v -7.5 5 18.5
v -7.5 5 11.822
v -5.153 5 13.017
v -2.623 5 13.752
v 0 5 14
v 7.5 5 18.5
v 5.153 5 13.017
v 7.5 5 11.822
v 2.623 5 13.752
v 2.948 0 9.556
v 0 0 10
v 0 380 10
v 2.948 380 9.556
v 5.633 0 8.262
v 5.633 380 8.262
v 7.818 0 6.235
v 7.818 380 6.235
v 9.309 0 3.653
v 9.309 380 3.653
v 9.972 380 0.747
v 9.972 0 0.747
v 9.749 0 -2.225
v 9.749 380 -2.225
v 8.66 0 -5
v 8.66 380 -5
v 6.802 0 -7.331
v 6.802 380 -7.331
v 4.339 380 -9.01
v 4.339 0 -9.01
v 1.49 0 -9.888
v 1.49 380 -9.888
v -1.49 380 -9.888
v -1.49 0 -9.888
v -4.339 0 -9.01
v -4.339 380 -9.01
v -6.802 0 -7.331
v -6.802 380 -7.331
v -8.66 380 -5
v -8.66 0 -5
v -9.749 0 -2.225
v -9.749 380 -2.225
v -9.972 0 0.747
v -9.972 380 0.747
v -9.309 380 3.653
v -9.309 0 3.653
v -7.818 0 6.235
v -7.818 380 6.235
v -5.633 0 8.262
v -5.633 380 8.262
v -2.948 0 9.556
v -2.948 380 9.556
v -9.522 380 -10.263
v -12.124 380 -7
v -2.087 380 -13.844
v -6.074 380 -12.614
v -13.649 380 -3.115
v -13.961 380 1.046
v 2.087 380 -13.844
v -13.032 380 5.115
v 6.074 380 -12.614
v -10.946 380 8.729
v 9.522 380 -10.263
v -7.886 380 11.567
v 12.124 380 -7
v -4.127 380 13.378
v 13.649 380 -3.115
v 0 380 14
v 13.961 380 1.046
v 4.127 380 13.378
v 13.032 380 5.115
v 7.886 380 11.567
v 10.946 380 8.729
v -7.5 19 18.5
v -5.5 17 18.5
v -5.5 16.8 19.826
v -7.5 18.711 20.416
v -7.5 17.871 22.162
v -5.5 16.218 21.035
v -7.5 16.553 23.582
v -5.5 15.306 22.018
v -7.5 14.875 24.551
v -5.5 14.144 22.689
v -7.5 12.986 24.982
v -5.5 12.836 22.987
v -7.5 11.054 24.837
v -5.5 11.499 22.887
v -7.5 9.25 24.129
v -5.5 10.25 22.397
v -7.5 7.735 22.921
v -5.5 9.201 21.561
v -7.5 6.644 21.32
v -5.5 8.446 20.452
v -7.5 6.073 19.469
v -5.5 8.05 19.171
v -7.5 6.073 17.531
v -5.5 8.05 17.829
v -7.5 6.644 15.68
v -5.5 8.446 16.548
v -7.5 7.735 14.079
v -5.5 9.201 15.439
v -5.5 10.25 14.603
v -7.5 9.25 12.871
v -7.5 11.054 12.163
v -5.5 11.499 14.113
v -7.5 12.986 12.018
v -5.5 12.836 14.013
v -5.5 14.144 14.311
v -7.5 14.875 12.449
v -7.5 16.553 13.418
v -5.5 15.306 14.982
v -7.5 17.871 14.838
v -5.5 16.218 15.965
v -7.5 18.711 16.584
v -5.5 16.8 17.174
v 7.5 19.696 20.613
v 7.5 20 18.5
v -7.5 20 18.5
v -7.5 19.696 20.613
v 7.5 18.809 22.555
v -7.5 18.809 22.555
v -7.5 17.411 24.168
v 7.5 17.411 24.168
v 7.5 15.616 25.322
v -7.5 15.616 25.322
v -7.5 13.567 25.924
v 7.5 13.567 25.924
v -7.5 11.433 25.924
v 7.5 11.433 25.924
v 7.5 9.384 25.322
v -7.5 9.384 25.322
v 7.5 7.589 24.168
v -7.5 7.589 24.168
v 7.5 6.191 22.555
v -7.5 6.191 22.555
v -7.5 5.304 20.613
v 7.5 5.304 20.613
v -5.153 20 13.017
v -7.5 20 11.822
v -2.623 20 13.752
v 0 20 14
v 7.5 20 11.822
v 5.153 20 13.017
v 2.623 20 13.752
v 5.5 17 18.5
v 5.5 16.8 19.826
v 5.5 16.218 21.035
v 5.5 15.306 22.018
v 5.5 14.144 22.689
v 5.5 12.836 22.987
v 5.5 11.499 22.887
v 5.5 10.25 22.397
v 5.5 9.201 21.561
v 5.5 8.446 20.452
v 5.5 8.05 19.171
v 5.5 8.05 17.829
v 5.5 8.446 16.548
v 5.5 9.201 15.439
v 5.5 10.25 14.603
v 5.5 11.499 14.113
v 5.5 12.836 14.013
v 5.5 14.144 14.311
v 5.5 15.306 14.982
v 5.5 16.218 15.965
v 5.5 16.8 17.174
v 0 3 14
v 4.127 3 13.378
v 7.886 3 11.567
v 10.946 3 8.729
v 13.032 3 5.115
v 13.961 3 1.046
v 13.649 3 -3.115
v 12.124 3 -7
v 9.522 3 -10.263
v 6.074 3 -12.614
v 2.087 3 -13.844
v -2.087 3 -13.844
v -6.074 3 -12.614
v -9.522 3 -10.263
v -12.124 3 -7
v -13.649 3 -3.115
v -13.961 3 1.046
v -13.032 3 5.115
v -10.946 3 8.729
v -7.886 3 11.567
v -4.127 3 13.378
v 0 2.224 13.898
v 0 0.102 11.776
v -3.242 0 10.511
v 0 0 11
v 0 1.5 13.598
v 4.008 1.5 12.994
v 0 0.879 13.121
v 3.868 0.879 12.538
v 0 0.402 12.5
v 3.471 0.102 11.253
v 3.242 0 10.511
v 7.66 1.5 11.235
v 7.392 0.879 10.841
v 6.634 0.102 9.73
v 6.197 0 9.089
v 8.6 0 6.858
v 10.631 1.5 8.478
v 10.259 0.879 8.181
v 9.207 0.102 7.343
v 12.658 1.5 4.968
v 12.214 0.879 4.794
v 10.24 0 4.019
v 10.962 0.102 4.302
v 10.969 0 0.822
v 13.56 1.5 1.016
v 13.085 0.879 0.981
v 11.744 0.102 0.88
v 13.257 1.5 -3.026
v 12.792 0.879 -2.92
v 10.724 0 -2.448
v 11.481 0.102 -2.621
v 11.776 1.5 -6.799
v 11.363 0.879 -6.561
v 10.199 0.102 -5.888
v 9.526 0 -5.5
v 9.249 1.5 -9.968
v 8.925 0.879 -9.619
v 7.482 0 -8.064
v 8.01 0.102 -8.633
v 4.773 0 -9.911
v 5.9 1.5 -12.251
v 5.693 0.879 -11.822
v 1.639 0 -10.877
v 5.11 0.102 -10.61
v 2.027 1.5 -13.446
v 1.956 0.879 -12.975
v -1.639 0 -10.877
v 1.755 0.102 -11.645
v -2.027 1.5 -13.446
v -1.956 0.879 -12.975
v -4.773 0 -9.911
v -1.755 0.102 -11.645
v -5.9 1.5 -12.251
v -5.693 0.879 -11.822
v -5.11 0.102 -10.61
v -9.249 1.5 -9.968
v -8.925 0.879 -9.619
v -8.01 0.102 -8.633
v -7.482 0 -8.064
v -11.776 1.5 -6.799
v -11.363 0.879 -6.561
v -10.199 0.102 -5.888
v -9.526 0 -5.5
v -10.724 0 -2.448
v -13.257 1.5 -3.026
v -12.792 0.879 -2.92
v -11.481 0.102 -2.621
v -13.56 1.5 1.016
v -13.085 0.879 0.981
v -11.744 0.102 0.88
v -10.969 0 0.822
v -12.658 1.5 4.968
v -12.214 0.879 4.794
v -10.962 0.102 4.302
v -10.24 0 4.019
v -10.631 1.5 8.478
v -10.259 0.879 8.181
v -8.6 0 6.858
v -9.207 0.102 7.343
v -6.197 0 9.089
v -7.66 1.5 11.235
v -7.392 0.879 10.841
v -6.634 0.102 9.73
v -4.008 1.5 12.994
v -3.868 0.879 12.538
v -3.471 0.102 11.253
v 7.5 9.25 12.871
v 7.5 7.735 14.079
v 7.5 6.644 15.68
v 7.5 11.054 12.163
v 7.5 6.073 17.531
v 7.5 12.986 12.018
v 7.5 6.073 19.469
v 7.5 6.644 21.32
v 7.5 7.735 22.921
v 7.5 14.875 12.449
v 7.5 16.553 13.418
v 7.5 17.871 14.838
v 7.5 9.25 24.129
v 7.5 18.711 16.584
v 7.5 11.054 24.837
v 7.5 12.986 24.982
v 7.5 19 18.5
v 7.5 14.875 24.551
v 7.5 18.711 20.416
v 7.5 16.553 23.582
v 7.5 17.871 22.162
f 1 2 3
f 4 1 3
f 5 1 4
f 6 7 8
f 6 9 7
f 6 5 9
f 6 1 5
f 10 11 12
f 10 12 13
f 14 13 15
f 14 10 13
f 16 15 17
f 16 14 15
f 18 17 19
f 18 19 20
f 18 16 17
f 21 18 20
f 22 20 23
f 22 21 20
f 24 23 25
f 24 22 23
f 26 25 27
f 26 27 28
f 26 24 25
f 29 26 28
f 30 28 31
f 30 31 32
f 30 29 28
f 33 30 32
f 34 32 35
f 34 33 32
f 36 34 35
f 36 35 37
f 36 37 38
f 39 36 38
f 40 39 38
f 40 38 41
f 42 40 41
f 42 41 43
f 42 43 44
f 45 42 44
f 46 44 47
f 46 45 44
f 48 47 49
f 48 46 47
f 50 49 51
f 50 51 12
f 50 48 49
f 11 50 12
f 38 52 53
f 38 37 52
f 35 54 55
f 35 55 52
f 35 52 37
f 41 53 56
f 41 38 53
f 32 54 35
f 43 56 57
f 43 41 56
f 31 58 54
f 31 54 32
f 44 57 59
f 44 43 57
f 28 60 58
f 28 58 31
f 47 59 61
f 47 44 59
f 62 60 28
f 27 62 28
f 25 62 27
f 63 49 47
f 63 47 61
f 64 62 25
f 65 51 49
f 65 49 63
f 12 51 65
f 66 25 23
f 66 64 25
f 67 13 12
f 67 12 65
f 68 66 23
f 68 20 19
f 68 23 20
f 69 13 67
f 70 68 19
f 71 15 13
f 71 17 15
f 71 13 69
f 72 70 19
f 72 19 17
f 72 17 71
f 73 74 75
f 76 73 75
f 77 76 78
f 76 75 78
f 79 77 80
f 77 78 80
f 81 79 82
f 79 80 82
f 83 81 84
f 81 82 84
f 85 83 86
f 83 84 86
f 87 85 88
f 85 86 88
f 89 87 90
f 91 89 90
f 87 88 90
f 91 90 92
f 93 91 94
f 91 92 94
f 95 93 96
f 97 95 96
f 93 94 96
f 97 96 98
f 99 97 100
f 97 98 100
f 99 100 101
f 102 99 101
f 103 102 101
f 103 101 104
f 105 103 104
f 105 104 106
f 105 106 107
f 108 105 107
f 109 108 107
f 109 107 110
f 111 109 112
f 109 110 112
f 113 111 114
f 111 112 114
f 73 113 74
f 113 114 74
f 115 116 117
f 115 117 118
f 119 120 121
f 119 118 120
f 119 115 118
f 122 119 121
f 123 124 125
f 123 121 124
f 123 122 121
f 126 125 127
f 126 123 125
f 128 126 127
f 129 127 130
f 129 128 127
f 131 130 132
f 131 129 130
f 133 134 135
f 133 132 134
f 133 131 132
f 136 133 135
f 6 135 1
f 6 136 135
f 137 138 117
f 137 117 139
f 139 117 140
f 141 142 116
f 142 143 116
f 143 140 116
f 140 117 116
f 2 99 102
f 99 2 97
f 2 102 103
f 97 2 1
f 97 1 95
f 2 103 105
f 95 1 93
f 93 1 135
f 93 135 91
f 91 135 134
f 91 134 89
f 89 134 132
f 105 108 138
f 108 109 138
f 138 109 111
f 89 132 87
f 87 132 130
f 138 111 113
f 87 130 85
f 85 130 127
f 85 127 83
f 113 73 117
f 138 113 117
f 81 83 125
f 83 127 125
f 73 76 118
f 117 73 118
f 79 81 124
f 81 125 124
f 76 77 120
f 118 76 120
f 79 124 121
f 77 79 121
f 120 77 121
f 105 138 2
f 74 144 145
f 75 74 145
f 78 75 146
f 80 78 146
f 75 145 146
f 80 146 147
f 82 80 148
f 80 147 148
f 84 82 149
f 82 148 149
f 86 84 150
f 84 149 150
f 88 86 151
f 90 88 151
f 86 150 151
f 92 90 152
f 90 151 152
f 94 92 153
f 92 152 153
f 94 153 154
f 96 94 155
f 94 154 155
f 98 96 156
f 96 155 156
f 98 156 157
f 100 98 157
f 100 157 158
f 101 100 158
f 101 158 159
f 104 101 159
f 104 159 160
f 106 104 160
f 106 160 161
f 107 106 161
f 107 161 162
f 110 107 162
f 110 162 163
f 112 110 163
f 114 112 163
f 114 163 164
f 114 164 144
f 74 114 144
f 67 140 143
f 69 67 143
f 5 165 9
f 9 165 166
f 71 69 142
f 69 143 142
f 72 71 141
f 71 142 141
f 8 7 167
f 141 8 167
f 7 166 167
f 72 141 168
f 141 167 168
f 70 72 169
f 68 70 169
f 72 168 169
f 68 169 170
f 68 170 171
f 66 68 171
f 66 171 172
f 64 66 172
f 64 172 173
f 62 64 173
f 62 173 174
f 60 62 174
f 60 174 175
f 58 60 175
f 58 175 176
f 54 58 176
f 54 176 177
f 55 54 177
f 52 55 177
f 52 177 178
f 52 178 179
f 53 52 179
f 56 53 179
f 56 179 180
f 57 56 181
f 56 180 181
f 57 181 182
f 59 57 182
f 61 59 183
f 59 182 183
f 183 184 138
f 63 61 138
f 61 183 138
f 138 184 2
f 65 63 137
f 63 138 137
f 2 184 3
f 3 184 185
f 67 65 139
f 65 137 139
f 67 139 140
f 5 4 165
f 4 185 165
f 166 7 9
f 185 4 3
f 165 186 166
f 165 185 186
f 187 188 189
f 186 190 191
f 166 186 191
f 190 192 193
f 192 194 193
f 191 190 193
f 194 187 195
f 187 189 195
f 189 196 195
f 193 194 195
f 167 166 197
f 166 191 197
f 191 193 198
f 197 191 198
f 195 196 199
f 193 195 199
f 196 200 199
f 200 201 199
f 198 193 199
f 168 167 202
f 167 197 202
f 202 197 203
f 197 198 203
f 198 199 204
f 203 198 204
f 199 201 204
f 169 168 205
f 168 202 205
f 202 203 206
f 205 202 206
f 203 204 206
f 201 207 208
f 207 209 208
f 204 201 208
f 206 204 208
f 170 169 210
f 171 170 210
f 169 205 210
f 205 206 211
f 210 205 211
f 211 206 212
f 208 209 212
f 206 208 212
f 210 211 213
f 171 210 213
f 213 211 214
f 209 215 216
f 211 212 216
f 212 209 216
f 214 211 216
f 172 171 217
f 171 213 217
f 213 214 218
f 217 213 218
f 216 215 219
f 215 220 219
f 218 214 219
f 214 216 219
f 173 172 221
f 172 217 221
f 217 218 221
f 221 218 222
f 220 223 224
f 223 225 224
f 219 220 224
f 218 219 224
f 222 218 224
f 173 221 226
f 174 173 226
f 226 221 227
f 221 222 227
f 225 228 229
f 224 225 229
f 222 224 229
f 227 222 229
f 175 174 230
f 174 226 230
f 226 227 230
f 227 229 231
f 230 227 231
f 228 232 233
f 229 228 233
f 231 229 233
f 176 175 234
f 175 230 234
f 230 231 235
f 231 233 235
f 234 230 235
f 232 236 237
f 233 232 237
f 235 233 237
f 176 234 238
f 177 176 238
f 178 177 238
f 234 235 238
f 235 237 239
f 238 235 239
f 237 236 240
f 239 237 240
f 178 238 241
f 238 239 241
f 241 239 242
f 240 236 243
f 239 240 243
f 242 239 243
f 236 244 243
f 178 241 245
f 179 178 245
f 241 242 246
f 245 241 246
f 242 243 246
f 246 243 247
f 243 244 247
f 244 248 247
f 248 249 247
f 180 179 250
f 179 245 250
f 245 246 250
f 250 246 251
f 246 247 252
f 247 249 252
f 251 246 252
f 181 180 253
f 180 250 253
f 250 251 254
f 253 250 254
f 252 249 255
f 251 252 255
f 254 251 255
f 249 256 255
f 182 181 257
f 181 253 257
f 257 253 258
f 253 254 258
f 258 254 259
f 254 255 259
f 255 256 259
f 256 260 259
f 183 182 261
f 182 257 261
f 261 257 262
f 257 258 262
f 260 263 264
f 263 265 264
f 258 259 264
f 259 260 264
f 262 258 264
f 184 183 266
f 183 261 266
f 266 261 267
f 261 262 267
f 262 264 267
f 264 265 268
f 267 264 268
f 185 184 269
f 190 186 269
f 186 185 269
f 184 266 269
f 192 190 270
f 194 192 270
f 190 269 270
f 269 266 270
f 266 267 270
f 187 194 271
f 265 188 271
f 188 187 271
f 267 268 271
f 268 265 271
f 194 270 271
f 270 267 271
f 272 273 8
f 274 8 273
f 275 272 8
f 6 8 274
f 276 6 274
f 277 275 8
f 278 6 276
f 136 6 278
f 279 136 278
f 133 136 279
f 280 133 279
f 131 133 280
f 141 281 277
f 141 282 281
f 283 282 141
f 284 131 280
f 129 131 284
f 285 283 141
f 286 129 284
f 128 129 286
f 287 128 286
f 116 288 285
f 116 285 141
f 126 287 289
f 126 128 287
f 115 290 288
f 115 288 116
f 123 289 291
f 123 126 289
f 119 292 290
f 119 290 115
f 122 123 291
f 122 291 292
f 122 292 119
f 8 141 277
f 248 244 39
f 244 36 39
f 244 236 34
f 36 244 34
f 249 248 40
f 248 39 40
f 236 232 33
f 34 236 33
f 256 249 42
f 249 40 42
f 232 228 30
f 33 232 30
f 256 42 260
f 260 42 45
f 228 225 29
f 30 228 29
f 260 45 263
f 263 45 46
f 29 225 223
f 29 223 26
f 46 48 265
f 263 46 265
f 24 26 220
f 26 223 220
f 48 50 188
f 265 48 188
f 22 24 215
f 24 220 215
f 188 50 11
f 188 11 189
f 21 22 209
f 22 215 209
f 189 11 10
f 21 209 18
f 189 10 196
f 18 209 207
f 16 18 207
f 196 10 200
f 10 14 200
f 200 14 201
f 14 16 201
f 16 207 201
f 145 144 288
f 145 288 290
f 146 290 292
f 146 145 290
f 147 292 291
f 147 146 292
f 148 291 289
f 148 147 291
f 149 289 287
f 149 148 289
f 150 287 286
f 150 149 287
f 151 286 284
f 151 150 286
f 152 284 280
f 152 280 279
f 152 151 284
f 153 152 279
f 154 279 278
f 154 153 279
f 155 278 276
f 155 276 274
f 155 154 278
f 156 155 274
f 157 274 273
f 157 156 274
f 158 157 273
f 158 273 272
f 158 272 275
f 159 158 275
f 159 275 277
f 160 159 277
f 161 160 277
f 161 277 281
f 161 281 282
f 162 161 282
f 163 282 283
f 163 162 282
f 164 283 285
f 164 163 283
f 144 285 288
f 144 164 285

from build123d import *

# Parameters (mm, degrees)
SZKIC1_R                                     = 14
SZKIC1_R_2                                   = 10
DODANIE_WYCI_GNI_CIE1_DEPTH                  = 380
SZKIC2_W                                     = 15
SZKIC2_H                                     = 15
DODANIE_WYCI_GNI_CIE2_DEPTH                  = 12
DODANIE_WYCI_GNI_CIE2_DIRECTION_2_REACH      = 383.287
DODANIE_WYCI_GNI_CIE2_DIRECTION_2_END_RADIUS = 14
ZAOKR_GLENIE1_RADIUS                         = 7.5
ZAOKR_GLENIE1_LENGTH                         = 15
SZKIC3_R                                     = 4.5
WYTNIJ_WYCI_GNI_CIE1_DEPTH                   = 382.4947575
SFAZOWANIE2_SIZE                             = 2
ZAOKR_GLENIE2_R                              = 3


with BuildPart() as part:
    # Szkic1 → Dodanie-wyciągnięcie1 (new body)
    with BuildSketch(Plane(origin=(0, 0, 0), x_dir=(1, 0, 0), z_dir=(0, 1, 0))):
        with Locations(Location((0, 0, 0), (0, 0, 270))):
            Circle(SZKIC1_R)
        with Locations(Location((0, 0, 0), (0, 0, 270))):
            Circle(SZKIC1_R_2, mode=Mode.SUBTRACT)
    extrude(amount=DODANIE_WYCI_GNI_CIE1_DEPTH)

    # Szkic2 → Dodanie-wyciągnięcie2 (add)
    with BuildSketch(Plane.XY.offset(14)):
        with Locations((0, 12.5)):
            Rectangle(SZKIC2_W, SZKIC2_H)
    extrude(amount=DODANIE_WYCI_GNI_CIE2_DEPTH)

    # Dodanie-wyciągnięcie2 direction 2: up to this cylinder (the profile starts outside it)
    dodanie_wyci_gni_cie2_direction_2_end = Plane(origin=(0, 12.5, 0), z_dir=(0, -1, 0)) * Cylinder(DODANIE_WYCI_GNI_CIE2_DIRECTION_2_END_RADIUS, 795.574, mode=Mode.PRIVATE)
    # Szkic2 → Dodanie-wyciągnięcie2 direction 2 (add, up to the surface)
    with BuildSketch(Plane.XY.offset(14), mode=Mode.PRIVATE) as dodanie_wyci_gni_cie2_direction_2_sk1:
        with Locations((0, 12.5)):
            Rectangle(SZKIC2_W, SZKIC2_H)
    dodanie_wyci_gni_cie2_direction_2_tool1 = extrude(dodanie_wyci_gni_cie2_direction_2_sk1.sketch, amount=-DODANIE_WYCI_GNI_CIE2_DIRECTION_2_REACH, mode=Mode.PRIVATE) - dodanie_wyci_gni_cie2_direction_2_end
    add(dodanie_wyci_gni_cie2_direction_2_tool1.solids().sort_by_distance((0, 12.5, 14))[0])
    add(dodanie_wyci_gni_cie2_direction_2_tool1.solids().sort_by_distance((0, 12.5, 14))[1])

    # Zaokrąglenie1: full round fillet: the end face becomes a half cylinder, R = half its width
    zaokr_glenie1_face = Plane((0, 12.5, 26), x_dir=(1, 0, 0), z_dir=(0, 0, 1))  # on the end face: x along it, z out of the body
    zaokr_glenie1_slab = zaokr_glenie1_face.offset(-ZAOKR_GLENIE1_RADIUS / 2) * Box(ZAOKR_GLENIE1_LENGTH, 2 * ZAOKR_GLENIE1_RADIUS, ZAOKR_GLENIE1_RADIUS, mode=Mode.PRIVATE)  # the body's end, R deep
    zaokr_glenie1_round = Plane((0, 12.5, 18.5), x_dir=(0, 0, 1), z_dir=(1, 0, 0)) * Cylinder(ZAOKR_GLENIE1_RADIUS, ZAOKR_GLENIE1_LENGTH, mode=Mode.PRIVATE)  # its axis R under the face
    add(zaokr_glenie1_slab - zaokr_glenie1_round, mode=Mode.SUBTRACT)

    # Szkic3 → Wytnij-wyciągnięcie1 (cut, through all)
    with BuildSketch(Plane(origin=(7.5, 0, 0), x_dir=(0, 0, -1), z_dir=(1, 0, 0))):
        with Locations(Location((-18.5, 12.5, 0), (0, 0, 90))):
            Circle(SZKIC3_R)
    extrude(amount=-WYTNIJ_WYCI_GNI_CIE1_DEPTH, mode=Mode.SUBTRACT)

    # Sfazowanie2
    sfazowanie2_edges = [part.edges().sort_by_distance(p)[0] for p in [
        (-7.5, 8, 18.5),
        (7.5, 8, 18.5),
    ]]
    chamfer(sfazowanie2_edges, length=SFAZOWANIE2_SIZE)

    # Zaokrąglenie2
    zaokr_glenie2_edges = [part.edges().sort_by_distance(p)[0] for p in [
        (0, 0, -14),
    ]]
    fillet(zaokr_glenie2_edges, radius=ZAOKR_GLENIE2_R)


solid = part.part
